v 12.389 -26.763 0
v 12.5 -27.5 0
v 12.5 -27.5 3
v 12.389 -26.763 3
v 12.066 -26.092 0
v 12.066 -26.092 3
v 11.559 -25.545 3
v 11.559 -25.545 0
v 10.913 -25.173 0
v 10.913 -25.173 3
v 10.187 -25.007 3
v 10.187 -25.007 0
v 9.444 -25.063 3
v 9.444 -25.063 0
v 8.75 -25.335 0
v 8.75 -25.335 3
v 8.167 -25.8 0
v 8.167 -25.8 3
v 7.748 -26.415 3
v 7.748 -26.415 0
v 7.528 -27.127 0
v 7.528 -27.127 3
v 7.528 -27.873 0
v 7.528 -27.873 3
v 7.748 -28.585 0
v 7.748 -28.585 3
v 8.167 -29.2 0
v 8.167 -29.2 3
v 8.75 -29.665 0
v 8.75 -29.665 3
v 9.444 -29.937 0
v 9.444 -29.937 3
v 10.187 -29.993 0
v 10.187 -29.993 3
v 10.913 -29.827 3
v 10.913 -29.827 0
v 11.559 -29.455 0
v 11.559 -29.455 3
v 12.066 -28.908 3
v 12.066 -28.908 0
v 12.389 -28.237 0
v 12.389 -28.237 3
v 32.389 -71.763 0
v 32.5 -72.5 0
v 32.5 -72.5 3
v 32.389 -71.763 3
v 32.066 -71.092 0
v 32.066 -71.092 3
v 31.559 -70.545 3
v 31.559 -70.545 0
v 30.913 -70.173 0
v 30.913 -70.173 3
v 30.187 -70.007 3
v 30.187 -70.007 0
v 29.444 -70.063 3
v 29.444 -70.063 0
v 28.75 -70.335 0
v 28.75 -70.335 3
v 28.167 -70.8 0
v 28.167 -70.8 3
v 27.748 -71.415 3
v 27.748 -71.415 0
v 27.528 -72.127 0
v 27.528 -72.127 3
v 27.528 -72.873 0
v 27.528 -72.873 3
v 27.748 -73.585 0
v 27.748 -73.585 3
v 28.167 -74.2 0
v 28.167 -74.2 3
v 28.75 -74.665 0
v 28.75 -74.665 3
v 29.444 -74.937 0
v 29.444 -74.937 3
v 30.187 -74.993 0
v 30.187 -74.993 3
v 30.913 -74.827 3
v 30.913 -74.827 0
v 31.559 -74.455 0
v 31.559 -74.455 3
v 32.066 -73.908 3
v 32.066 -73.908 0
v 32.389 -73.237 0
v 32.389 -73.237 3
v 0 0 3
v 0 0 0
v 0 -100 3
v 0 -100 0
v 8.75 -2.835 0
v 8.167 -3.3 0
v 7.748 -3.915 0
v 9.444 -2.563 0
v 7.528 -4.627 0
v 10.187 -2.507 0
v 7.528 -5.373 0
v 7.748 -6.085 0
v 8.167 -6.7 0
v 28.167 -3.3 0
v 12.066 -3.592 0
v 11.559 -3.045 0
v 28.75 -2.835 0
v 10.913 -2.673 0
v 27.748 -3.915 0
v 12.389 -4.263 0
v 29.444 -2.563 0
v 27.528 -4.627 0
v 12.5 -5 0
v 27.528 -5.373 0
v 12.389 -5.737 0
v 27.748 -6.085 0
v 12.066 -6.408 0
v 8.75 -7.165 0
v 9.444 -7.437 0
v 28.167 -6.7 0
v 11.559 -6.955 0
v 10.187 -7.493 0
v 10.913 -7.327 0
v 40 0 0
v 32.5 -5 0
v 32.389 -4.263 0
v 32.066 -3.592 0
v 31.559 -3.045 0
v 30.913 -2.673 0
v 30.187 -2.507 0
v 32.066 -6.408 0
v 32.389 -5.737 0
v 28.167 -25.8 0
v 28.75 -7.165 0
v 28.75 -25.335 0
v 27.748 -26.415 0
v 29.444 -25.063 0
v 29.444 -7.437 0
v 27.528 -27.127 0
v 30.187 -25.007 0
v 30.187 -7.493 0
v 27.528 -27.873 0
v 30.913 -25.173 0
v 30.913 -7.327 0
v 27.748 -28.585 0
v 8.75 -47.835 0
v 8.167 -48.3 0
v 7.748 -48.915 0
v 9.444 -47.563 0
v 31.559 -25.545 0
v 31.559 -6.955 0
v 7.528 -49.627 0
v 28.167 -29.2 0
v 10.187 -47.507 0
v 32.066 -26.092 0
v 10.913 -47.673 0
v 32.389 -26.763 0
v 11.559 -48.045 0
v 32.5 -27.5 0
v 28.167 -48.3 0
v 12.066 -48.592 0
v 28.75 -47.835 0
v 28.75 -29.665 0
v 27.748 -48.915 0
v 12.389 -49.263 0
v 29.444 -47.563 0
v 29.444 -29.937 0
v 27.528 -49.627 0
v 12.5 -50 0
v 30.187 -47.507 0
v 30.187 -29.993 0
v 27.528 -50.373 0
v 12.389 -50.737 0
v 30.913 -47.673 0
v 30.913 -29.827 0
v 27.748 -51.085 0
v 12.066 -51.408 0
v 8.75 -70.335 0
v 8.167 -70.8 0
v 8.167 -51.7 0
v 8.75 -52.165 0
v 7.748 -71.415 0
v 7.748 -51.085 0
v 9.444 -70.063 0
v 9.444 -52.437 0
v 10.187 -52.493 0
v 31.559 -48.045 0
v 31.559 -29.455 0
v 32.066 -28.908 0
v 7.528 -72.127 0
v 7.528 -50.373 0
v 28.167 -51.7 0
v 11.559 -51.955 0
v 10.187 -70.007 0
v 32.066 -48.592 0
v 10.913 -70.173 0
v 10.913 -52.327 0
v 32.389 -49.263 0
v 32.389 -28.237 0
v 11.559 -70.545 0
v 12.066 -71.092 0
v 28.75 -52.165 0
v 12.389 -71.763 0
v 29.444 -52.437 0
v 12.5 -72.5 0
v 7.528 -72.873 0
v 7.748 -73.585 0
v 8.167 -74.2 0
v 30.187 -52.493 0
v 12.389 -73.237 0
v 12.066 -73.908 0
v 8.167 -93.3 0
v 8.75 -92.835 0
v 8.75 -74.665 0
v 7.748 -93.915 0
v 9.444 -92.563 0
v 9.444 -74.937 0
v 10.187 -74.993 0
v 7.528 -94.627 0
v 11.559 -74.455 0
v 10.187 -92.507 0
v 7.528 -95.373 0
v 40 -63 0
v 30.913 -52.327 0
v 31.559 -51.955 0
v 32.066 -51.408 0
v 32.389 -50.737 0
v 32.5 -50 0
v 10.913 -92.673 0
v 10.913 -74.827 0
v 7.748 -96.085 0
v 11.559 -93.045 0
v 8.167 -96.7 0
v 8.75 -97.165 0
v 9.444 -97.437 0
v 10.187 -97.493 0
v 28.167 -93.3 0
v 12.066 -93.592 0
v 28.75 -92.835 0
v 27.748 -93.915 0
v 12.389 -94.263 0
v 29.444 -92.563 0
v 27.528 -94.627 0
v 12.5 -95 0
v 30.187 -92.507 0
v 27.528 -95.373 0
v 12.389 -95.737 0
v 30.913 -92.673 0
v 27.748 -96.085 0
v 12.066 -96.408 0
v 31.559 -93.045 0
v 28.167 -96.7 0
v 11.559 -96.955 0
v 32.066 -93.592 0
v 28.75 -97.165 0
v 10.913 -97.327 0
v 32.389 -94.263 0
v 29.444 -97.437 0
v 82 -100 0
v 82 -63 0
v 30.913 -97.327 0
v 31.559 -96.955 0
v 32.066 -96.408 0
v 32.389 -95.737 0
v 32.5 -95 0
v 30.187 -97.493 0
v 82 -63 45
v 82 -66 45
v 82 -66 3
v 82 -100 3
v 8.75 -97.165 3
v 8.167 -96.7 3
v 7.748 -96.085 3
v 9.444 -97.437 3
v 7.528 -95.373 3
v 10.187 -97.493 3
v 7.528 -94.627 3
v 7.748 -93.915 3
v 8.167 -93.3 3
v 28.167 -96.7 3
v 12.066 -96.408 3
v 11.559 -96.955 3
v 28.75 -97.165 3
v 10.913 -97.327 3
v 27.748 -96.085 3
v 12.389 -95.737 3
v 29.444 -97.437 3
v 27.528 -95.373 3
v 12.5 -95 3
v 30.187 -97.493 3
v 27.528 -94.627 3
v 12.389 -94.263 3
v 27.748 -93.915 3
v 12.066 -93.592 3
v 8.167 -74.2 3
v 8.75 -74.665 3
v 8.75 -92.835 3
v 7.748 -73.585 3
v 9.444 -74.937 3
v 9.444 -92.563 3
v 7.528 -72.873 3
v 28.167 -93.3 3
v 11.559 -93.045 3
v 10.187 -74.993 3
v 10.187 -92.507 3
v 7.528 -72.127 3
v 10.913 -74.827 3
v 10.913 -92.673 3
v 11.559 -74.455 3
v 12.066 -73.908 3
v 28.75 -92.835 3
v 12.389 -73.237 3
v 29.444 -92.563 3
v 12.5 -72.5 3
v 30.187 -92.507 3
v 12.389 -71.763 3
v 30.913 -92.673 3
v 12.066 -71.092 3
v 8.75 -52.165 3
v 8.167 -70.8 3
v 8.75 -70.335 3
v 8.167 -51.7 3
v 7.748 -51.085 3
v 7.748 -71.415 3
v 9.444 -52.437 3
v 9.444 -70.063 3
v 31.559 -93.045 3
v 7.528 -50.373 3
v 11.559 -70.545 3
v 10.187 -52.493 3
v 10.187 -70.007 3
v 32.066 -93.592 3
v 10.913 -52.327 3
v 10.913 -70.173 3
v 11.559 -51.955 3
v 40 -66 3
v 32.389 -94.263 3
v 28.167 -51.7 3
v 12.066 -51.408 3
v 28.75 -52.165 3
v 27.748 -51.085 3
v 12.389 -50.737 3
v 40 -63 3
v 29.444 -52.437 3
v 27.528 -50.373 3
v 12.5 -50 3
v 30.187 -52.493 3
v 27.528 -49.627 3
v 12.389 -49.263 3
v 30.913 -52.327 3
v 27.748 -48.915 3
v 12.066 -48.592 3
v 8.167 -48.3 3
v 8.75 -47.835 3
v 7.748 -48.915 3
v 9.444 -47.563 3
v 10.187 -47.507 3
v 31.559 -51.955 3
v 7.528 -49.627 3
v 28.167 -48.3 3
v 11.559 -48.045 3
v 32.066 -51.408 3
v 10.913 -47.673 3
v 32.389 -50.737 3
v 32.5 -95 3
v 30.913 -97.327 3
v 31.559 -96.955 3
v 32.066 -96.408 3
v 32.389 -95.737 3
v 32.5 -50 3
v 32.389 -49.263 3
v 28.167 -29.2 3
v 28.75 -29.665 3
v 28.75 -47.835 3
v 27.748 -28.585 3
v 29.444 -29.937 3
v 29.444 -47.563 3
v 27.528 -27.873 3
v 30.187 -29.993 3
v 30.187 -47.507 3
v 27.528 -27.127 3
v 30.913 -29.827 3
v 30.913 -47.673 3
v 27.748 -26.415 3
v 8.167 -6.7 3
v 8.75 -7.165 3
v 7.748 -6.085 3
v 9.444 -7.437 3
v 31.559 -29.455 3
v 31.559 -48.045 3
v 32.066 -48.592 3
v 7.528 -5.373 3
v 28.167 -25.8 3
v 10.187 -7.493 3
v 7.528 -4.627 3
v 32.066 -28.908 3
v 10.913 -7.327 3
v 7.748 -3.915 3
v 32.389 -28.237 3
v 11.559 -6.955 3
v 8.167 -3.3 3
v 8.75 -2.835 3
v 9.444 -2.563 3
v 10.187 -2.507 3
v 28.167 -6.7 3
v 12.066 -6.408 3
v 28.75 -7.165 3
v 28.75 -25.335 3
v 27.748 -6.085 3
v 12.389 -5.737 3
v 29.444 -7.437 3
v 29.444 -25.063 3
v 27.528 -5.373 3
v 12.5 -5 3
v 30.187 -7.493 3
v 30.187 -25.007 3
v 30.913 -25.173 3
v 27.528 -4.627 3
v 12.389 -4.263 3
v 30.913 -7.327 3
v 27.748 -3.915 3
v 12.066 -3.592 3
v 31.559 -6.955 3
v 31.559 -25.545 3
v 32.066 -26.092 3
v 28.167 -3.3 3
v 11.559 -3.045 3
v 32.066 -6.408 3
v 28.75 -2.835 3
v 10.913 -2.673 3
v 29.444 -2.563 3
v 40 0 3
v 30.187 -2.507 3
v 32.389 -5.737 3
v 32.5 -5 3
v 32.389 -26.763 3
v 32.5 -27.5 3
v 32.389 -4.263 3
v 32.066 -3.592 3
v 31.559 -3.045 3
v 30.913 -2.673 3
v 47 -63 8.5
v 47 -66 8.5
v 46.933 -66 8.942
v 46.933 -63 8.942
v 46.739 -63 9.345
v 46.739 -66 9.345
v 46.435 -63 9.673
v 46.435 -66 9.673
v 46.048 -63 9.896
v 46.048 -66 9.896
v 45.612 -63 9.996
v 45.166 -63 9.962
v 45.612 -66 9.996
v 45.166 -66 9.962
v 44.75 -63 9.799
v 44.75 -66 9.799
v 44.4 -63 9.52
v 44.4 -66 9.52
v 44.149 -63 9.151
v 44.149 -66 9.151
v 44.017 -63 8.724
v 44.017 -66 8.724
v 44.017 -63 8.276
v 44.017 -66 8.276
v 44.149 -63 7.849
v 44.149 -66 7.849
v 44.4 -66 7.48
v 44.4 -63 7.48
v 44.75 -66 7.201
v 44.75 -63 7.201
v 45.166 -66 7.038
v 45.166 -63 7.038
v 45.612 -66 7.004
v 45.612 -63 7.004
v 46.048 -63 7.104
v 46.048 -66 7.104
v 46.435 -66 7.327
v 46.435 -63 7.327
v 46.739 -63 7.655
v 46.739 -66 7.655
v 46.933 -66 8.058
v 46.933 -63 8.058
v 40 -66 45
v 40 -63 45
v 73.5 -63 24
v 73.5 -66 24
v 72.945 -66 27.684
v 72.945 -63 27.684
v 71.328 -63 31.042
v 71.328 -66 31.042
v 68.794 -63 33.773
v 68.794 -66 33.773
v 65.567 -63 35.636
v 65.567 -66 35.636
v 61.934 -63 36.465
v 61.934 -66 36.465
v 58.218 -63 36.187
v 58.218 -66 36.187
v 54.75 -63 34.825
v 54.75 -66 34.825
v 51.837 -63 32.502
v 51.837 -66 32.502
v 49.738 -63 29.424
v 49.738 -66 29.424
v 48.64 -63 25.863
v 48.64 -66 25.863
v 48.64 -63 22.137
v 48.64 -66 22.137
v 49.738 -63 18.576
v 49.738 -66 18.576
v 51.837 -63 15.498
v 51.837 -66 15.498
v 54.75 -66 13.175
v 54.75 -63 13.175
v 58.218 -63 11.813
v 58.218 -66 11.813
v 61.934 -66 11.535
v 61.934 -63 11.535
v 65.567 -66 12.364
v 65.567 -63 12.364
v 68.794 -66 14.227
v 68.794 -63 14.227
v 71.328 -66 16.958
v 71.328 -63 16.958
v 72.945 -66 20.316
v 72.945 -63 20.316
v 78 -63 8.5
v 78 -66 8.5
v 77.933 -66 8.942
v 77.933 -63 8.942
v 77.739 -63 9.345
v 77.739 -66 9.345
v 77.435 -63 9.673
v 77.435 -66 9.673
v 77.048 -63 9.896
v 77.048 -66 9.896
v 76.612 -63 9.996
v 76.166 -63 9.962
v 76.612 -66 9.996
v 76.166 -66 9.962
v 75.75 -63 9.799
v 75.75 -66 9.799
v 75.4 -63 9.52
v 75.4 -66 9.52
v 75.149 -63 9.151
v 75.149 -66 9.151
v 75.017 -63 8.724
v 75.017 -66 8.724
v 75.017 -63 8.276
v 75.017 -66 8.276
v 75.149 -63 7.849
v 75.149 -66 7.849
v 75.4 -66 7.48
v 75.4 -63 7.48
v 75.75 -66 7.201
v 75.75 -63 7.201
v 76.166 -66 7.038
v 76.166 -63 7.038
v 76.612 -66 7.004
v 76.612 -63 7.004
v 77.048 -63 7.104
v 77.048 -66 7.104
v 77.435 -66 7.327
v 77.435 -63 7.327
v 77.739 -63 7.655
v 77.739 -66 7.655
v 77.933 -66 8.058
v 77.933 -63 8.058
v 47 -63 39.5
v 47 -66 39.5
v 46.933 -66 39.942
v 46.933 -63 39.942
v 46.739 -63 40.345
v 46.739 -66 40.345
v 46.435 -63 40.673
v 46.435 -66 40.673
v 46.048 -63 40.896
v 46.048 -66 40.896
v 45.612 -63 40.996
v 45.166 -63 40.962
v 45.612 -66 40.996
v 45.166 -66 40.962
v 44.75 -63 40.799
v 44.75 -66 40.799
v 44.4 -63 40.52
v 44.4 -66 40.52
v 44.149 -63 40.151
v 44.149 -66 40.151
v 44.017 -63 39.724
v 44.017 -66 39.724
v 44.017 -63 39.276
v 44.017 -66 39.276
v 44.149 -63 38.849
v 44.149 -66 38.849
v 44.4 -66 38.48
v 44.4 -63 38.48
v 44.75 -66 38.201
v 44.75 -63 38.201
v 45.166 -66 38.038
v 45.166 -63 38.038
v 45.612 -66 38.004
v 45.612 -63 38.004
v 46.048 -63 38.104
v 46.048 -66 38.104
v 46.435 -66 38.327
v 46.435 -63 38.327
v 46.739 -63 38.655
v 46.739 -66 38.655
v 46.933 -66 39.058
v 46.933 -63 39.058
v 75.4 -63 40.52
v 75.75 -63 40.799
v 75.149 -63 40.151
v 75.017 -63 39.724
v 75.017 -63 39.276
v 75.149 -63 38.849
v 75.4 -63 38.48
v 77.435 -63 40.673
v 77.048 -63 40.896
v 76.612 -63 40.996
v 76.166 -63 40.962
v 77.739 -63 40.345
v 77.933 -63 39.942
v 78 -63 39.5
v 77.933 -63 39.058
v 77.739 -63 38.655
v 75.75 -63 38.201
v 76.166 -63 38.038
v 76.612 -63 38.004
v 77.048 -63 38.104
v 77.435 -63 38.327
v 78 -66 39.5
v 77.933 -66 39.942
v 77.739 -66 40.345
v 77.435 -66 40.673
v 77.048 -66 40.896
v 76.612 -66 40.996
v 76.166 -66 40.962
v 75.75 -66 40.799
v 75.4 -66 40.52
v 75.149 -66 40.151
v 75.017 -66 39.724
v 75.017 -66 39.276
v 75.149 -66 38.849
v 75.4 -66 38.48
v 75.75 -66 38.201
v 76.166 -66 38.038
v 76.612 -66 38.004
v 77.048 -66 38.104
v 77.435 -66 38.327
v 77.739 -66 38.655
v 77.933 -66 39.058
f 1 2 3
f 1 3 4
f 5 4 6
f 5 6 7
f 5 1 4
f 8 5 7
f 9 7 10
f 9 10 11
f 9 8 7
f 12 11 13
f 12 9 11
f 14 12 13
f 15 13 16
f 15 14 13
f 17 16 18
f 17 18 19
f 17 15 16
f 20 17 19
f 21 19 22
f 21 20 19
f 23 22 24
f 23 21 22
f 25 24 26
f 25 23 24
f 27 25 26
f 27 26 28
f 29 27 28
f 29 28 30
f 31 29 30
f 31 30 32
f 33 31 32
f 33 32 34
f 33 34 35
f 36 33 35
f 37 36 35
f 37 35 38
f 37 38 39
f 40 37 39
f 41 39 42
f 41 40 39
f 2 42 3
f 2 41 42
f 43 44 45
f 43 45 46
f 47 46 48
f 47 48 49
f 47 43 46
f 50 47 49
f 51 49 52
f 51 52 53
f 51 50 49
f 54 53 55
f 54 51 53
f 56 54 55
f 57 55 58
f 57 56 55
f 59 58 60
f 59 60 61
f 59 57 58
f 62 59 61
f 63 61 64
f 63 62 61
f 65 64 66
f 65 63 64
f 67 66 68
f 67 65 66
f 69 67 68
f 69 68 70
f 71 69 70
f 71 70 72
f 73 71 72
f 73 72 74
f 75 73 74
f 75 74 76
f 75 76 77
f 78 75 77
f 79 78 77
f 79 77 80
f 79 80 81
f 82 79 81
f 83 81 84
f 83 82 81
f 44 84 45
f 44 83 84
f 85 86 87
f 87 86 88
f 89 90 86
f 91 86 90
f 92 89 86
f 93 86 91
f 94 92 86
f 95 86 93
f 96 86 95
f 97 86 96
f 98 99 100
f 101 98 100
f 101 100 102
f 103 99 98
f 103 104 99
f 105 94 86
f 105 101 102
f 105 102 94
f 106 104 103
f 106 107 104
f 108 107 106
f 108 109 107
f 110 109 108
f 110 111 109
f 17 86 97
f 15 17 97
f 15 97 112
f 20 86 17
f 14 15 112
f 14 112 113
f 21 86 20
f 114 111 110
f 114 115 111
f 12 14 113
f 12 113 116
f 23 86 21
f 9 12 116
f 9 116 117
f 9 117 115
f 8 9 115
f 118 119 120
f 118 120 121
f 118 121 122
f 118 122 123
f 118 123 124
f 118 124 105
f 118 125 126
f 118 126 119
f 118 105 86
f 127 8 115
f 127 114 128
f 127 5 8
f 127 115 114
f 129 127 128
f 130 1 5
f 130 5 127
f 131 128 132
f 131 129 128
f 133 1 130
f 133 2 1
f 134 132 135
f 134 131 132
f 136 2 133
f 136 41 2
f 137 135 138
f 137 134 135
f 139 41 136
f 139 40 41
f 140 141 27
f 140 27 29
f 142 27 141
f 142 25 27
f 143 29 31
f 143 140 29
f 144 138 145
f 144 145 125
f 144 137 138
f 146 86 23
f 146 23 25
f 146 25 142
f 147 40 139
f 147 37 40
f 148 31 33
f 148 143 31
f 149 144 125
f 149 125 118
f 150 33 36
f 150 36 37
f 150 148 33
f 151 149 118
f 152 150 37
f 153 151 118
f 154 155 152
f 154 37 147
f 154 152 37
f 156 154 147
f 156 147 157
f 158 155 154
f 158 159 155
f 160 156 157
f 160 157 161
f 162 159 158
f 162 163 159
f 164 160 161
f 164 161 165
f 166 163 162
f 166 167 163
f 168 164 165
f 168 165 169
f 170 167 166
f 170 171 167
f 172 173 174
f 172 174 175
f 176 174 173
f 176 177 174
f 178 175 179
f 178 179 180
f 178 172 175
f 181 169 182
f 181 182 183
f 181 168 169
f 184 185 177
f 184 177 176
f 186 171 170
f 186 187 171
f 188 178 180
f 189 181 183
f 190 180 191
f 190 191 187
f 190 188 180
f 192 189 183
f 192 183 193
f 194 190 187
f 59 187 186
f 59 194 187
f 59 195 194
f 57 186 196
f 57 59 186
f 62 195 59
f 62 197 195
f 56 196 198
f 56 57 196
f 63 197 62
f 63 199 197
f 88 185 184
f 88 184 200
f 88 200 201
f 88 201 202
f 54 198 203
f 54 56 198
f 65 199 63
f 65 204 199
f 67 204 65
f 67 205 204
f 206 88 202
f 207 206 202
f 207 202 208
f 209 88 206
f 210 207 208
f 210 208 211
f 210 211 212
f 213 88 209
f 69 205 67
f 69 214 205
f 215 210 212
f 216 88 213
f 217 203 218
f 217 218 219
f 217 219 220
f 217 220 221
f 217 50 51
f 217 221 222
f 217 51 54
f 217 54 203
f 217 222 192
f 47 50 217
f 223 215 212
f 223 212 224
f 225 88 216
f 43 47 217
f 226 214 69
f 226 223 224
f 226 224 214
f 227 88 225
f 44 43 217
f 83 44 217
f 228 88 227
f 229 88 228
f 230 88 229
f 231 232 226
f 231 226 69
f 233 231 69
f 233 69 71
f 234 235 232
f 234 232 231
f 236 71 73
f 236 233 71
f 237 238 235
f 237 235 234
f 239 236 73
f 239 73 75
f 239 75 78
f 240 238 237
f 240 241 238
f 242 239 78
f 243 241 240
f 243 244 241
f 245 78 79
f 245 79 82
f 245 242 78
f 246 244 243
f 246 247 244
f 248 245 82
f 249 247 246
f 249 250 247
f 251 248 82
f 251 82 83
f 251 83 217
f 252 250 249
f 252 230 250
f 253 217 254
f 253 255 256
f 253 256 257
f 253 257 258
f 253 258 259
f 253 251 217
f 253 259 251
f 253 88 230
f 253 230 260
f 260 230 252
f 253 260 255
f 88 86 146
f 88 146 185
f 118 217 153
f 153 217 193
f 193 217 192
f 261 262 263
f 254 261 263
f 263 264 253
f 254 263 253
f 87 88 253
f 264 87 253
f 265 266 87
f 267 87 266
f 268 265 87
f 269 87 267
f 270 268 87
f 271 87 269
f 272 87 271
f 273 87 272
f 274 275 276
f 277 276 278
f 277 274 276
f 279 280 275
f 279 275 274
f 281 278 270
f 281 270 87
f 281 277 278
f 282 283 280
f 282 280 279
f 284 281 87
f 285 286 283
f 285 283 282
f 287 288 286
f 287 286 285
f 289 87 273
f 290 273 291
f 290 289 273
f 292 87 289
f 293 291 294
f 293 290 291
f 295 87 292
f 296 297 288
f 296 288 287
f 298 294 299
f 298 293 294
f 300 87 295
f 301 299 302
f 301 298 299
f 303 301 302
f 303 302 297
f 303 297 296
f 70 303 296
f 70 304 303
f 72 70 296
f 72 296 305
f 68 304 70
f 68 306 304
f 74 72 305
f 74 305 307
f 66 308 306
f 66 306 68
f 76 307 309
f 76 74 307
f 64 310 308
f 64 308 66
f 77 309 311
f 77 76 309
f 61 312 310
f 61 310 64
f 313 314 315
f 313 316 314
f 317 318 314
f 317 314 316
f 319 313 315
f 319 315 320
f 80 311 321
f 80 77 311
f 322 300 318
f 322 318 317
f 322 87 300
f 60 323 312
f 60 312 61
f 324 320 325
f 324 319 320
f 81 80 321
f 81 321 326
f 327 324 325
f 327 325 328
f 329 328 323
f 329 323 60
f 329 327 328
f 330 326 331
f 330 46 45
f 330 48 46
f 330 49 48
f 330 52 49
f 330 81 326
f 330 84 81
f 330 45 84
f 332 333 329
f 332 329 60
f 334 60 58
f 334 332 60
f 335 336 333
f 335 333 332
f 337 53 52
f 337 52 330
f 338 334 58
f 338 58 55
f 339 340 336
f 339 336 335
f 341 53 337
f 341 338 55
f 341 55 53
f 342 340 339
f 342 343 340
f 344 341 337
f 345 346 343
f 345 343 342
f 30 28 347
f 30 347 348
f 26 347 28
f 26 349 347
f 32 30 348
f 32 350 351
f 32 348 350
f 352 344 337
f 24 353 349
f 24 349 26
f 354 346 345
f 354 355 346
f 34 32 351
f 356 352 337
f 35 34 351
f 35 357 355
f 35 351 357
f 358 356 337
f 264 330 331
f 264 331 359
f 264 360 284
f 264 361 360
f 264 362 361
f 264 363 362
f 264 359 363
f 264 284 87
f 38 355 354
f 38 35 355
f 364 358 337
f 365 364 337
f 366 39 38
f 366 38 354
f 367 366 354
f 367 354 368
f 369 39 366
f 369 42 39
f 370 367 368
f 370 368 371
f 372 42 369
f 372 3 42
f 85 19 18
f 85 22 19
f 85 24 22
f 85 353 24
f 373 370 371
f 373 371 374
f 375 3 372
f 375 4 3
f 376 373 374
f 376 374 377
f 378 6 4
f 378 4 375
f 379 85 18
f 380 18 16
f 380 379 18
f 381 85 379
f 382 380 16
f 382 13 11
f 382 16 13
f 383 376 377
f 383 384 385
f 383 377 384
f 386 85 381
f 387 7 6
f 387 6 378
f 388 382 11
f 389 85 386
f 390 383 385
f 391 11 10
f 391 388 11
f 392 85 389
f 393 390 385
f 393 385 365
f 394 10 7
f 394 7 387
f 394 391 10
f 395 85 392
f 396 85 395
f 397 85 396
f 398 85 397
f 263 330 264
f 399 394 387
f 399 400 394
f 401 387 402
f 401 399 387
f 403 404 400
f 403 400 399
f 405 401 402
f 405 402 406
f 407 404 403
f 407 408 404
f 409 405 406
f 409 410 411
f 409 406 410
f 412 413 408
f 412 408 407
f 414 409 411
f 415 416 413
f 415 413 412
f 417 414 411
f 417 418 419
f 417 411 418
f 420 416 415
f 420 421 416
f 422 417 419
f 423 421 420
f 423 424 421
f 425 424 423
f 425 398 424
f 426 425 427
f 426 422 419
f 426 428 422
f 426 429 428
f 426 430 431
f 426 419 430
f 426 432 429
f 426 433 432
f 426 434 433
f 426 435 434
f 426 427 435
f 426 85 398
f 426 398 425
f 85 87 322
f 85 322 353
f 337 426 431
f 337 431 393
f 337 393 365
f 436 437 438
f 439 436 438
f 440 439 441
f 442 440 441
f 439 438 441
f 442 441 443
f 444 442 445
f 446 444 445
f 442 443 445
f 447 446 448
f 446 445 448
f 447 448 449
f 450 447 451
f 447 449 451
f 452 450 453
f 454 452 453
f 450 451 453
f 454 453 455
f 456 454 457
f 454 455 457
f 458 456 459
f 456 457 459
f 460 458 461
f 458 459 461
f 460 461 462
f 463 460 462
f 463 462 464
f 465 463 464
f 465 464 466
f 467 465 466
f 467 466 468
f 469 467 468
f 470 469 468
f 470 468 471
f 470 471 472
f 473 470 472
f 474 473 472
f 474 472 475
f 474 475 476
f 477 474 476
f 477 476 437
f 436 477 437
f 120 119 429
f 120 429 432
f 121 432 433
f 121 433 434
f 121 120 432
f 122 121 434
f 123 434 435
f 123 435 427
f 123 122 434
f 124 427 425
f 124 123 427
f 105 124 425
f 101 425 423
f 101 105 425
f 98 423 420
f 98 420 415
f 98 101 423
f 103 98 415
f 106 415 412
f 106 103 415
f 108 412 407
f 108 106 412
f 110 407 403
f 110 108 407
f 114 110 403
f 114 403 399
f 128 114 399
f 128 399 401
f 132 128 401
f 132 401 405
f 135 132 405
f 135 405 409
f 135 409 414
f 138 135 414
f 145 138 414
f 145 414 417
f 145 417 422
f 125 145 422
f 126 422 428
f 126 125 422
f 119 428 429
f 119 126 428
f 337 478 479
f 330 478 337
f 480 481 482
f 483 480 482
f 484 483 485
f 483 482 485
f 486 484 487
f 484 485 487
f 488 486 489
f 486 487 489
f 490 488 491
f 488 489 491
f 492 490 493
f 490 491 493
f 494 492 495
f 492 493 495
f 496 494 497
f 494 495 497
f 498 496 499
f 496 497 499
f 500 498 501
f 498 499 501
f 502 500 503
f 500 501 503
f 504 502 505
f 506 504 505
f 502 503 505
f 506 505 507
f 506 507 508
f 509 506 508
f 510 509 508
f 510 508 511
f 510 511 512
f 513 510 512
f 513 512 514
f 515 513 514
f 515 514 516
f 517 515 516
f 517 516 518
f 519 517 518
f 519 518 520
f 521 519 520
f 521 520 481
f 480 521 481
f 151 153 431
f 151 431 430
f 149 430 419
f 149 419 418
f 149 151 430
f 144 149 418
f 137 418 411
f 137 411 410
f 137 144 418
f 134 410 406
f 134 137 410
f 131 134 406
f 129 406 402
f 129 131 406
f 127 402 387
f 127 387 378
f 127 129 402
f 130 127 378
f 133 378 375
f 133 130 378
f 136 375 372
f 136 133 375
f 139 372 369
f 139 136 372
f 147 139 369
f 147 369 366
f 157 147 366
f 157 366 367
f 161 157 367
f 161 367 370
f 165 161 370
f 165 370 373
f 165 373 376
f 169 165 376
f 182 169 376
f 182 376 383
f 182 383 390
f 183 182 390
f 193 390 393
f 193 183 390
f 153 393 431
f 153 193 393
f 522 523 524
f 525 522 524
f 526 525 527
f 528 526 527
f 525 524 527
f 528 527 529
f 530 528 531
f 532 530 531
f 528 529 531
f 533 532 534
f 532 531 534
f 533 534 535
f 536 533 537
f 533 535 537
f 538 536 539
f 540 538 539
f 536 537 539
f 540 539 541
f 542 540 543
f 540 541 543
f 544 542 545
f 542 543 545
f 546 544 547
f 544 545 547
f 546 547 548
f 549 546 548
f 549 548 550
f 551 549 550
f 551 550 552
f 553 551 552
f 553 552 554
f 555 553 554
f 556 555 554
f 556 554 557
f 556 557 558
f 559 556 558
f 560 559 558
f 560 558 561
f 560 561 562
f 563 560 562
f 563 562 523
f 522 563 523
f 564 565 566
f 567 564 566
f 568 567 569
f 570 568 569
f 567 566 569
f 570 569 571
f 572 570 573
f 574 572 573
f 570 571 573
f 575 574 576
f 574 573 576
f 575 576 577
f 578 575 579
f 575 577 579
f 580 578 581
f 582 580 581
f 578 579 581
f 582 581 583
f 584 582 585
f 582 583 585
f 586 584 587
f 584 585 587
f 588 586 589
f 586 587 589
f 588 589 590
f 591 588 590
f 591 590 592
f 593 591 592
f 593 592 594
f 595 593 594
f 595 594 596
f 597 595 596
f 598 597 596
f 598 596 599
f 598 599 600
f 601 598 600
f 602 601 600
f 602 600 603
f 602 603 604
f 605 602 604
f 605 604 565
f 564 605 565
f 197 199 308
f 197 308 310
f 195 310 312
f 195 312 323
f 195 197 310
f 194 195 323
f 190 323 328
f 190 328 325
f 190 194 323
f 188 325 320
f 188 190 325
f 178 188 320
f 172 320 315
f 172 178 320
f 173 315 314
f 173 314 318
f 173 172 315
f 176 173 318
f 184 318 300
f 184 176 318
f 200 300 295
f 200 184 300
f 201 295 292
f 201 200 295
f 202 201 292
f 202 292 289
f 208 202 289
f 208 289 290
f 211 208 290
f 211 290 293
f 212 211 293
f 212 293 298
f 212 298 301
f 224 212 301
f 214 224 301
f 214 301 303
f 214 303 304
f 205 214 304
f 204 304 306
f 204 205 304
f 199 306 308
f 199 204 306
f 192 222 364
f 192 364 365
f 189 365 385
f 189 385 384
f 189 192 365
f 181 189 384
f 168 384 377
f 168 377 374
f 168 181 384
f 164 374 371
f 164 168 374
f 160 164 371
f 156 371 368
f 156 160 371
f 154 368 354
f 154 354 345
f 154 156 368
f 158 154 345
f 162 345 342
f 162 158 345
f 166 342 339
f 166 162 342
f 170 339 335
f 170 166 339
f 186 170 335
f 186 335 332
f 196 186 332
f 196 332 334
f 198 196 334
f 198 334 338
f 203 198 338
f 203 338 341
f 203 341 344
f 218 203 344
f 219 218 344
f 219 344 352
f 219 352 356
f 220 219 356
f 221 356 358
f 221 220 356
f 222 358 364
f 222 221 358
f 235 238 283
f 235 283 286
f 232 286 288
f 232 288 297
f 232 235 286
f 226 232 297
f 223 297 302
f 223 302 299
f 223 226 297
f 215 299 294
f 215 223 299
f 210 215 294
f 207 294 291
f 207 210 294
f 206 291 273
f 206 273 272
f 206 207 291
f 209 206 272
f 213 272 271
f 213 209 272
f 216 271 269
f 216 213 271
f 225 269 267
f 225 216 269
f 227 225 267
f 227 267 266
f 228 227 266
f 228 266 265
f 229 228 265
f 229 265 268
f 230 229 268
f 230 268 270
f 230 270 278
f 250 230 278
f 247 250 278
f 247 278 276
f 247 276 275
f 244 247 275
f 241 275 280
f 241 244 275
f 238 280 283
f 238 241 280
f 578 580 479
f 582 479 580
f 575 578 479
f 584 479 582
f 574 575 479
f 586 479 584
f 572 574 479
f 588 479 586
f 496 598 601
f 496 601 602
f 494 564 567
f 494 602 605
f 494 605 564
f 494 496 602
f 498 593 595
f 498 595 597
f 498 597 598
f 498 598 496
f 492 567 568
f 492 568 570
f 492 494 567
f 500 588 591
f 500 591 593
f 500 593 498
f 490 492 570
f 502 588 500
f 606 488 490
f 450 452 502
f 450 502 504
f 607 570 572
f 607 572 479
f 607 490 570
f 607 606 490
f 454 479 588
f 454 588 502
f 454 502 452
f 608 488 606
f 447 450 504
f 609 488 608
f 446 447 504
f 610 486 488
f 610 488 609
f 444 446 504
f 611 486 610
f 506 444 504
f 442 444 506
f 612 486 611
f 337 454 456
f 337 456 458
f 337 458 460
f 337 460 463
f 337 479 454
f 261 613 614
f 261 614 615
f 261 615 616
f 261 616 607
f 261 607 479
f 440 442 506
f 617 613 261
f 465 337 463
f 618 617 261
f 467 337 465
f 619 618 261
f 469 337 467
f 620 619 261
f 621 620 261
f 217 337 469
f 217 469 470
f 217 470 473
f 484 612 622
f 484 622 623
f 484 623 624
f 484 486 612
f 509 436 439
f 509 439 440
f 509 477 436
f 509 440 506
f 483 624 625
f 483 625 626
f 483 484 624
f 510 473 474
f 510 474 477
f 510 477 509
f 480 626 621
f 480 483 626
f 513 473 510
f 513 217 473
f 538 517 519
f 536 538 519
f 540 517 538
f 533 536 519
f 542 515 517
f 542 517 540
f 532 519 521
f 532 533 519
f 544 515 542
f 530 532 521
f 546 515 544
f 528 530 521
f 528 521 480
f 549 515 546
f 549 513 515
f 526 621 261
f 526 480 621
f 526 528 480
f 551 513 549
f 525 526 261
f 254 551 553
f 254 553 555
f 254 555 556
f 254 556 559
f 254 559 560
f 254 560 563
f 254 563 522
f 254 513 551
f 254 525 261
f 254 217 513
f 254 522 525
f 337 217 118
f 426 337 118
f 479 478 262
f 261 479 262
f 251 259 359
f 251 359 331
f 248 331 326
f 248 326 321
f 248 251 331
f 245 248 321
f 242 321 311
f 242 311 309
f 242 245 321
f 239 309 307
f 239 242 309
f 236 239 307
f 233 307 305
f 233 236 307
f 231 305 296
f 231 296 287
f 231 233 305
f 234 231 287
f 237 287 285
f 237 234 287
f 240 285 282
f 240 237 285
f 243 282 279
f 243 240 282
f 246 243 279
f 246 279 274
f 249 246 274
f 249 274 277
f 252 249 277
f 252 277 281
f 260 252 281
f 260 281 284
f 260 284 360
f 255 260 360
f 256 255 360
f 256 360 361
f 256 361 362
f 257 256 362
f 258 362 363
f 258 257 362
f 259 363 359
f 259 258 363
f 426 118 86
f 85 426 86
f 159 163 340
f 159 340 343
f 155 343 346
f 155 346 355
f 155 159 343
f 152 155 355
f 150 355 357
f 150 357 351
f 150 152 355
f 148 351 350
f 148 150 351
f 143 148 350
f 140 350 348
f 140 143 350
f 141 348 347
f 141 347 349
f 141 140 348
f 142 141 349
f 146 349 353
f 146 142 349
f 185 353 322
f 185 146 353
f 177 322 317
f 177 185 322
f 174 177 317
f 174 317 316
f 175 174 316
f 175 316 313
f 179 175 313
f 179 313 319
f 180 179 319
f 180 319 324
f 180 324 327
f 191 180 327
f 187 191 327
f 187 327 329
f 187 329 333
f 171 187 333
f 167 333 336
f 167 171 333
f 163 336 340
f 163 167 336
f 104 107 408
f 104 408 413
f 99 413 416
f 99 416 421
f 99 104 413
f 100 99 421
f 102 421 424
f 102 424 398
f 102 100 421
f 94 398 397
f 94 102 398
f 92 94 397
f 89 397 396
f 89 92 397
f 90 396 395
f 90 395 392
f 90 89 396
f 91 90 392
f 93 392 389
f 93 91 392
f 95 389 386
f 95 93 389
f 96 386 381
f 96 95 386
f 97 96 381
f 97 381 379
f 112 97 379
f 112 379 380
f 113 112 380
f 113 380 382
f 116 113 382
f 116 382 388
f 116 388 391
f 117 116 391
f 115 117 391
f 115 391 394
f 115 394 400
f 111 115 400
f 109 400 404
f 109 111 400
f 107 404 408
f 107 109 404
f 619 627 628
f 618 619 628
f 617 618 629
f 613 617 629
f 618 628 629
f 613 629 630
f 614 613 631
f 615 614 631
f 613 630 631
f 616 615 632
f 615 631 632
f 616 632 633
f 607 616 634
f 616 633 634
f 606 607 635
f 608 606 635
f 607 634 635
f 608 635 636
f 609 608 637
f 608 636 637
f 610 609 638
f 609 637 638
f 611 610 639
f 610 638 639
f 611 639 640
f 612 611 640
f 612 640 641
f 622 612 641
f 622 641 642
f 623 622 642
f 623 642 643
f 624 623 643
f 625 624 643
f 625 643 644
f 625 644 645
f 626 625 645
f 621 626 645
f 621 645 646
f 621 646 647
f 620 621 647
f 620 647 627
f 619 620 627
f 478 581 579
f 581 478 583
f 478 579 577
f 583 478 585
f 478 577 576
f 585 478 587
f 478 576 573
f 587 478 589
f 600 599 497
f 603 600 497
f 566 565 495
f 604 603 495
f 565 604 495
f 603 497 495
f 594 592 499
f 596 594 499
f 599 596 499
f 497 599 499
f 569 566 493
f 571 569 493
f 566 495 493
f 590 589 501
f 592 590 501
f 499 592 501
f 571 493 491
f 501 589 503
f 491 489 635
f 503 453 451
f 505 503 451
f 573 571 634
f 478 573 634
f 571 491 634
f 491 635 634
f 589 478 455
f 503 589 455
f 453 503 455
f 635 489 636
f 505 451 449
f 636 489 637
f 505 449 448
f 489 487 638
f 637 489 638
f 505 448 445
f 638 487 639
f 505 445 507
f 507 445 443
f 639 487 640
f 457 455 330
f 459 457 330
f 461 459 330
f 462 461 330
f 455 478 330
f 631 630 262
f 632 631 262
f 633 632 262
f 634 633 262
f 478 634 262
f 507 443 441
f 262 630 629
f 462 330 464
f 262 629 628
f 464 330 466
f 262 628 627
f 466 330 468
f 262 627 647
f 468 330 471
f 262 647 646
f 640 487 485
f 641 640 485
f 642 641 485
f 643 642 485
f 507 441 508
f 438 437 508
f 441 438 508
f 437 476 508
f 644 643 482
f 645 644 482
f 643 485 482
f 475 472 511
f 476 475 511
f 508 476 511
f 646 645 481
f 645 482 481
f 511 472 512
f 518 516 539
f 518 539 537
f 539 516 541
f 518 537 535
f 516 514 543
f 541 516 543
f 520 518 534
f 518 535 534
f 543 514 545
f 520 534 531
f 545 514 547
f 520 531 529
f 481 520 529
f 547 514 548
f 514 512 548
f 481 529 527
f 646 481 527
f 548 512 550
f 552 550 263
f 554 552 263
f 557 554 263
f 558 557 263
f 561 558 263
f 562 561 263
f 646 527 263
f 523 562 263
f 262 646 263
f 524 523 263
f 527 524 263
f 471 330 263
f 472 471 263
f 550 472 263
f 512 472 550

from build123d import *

# Parameters (mm, degrees)
SKETCH1_R           = 2.5
BOSS_EXTRUDE1_DEPTH = 3
SKETCH2_W           = 42
SKETCH2_H           = 45
BOSS_EXTRUDE2_DEPTH = 3
SKETCH3_R           = 12.5
SKETCH3_R_2         = 1.5
CUT_EXTRUDE1_DEPTH  = 13


with BuildPart() as part:
    # Sketch1 → Boss-Extrude1 (new body)
    with BuildSketch(Plane.XY):
        Polygon((40, 0), (0, 0), (0, -100), (82, -100), (82, -66), (40, -66), align=None)
        with Locations((30, -5)):
            Circle(SKETCH1_R, mode=Mode.SUBTRACT)
        with Locations((10, -5)):
            Circle(SKETCH1_R, mode=Mode.SUBTRACT)
        with Locations((10, -27.5)):
            Circle(SKETCH1_R, mode=Mode.SUBTRACT)
        with Locations((10, -50)):
            Circle(SKETCH1_R, mode=Mode.SUBTRACT)
        with Locations((10, -72.5)):
            Circle(SKETCH1_R, mode=Mode.SUBTRACT)
        with Locations((10, -95)):
            Circle(SKETCH1_R, mode=Mode.SUBTRACT)
        with Locations((30, -27.5)):
            Circle(SKETCH1_R, mode=Mode.SUBTRACT)
        with Locations((30, -50)):
            Circle(SKETCH1_R, mode=Mode.SUBTRACT)
        with Locations((30, -72.5)):
            Circle(SKETCH1_R, mode=Mode.SUBTRACT)
        with Locations((30, -95)):
            Circle(SKETCH1_R, mode=Mode.SUBTRACT)
    extrude(amount=BOSS_EXTRUDE1_DEPTH)

    # Sketch2 → Boss-Extrude2 (add)
    with BuildSketch(Plane(origin=(0, -66, 0), x_dir=(1, 0, 0), z_dir=(0, 1, 0))):
        with Locations((61, -22.5)):
            Rectangle(SKETCH2_W, SKETCH2_H)
    extrude(amount=BOSS_EXTRUDE2_DEPTH)

    # Sketch3 → Cut-Extrude1 (cut)
    with BuildSketch(Plane.XZ.offset(66)):
        with Locations((61, 24)):
            Circle(SKETCH3_R)
        with Locations((45.5, 39.5)):
            Circle(SKETCH3_R_2)
        with Locations((45.5, 8.5)):
            Circle(SKETCH3_R_2)
        with Locations((76.5, 8.5)):
            Circle(SKETCH3_R_2)
        with Locations((76.5, 39.5)):
            Circle(SKETCH3_R_2)
    extrude(amount=-CUT_EXTRUDE1_DEPTH, mode=Mode.SUBTRACT)


solid = part.part
